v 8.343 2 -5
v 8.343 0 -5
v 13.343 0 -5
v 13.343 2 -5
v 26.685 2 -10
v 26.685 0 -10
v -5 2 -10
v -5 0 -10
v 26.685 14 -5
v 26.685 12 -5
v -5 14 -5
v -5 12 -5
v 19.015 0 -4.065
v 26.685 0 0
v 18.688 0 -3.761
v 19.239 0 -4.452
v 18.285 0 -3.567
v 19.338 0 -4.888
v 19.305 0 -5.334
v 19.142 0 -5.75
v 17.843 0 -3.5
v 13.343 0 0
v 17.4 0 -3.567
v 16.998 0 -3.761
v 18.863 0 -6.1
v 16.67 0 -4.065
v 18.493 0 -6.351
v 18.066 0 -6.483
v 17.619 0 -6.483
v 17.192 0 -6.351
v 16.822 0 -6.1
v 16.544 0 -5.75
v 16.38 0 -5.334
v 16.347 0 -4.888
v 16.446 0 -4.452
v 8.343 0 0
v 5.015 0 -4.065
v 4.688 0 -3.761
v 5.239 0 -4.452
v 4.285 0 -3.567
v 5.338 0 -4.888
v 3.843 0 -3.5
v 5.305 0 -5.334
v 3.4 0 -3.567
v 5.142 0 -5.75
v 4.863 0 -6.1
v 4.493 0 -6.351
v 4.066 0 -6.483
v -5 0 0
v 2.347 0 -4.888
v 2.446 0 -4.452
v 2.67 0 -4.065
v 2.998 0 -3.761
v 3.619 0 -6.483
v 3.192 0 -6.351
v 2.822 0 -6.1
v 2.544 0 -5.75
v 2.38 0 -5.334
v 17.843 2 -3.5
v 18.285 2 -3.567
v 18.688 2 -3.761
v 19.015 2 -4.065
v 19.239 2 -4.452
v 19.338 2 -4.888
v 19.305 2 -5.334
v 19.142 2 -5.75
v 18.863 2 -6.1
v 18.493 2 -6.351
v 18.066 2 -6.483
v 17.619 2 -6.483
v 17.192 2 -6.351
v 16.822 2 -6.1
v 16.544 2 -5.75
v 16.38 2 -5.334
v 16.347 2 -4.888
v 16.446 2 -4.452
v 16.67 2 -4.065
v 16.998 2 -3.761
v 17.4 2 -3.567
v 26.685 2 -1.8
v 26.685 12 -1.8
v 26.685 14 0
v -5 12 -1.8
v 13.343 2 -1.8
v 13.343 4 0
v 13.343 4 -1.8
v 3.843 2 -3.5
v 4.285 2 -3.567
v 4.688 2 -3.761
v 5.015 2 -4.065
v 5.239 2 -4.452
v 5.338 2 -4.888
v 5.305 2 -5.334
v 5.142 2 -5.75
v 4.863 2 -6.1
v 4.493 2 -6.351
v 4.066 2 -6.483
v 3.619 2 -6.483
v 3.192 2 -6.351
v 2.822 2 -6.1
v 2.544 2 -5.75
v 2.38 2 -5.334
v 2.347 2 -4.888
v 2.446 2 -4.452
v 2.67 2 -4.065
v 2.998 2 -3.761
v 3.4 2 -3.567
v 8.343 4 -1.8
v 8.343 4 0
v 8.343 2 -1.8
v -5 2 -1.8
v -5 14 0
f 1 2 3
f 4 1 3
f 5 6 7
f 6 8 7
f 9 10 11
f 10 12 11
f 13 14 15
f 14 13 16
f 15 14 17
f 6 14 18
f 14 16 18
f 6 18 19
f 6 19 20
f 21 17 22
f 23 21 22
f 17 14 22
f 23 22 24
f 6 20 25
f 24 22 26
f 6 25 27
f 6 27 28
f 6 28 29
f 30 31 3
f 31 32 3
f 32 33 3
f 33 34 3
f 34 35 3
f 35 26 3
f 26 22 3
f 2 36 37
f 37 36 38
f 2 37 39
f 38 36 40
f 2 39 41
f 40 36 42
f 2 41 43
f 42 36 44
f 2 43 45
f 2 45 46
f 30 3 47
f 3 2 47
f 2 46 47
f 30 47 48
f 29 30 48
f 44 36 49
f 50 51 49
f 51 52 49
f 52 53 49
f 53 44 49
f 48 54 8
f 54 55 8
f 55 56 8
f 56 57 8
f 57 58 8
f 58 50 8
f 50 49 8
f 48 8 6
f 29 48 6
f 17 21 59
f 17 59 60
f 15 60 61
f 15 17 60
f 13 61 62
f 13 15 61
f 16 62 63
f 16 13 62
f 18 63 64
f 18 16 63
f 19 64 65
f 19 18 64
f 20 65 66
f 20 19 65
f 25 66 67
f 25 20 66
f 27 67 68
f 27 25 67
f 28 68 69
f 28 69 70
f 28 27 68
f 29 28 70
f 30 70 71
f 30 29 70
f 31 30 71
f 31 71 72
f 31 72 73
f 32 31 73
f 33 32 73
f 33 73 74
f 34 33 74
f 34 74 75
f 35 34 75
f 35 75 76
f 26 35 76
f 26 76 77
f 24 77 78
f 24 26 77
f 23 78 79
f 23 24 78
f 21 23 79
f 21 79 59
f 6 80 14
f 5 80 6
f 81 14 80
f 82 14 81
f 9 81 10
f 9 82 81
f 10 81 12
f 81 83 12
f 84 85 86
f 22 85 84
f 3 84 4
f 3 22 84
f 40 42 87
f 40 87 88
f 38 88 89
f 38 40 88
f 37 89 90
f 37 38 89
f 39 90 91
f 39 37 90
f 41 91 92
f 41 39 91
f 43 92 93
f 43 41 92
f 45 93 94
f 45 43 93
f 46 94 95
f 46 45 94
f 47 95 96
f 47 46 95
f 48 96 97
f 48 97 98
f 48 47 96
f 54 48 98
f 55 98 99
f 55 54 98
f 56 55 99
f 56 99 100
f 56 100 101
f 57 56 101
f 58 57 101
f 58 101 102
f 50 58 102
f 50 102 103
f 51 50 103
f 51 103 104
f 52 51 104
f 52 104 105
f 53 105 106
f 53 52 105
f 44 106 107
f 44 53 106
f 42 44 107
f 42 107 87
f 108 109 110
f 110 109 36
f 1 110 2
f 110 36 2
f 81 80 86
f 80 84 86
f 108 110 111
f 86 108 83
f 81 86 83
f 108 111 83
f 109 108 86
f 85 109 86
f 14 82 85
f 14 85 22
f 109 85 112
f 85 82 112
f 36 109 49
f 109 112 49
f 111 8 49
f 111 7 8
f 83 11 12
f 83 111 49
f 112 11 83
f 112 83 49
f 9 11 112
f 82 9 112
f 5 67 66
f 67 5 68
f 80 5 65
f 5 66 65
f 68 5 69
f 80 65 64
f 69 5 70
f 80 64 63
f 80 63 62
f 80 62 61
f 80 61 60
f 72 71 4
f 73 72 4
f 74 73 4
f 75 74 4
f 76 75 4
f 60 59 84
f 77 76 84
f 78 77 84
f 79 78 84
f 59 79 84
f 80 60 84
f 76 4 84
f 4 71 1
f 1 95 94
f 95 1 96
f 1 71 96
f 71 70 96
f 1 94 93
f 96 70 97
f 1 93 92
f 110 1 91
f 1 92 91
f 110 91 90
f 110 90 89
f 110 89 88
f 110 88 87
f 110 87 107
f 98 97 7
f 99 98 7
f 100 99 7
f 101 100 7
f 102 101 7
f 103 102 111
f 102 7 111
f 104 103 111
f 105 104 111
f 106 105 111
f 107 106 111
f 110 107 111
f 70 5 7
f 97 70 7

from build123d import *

# Parameters (mm, degrees)
CROQUIS2_W                 = 21.685111185
CROQUIS2_H                 = 10
CROQUIS2_R                 = 1.5
SALIENTE_EXTRUIR1_DEPTH    = 2
CROQUIS3_W                 = 21.685111185
CROQUIS3_H                 = 1.8
SALIENTE_EXTRUIR2_DEPTH    = 10
CORTAR_EXTRUIR1_DEPTH      = 2
CORTAR_EXTRUIR1_DEPTH_BACK = 10
CROQUIS4_W                 = 5
CROQUIS4_H                 = 5
CROQUIS7_W                 = 21.685111185
CROQUIS7_H                 = 5
SALIENTE_EXTRUIR4_DEPTH    = 2
SALIENTE_EXTRUIR5_DEPTH    = 5
SALIENTE_EXTRUIR6_DEPTH    = 5


with BuildPart() as part:
    # Croquis2 → Saliente-Extruir1 (new body)
    with BuildSketch(Plane(origin=(0, 0, 0), x_dir=(1, 0, 0), z_dir=(0, 1, 0))):
        with Locations((10.842555593, 5)):
            Rectangle(CROQUIS2_W, CROQUIS2_H)
        with Locations(Location((3.842555592, 5, 0), (0, 0, 270))):
            Circle(CROQUIS2_R, mode=Mode.SUBTRACT)
        with Locations(Location((17.842555592, 5, 0), (0, 0, 270))):
            Circle(CROQUIS2_R, mode=Mode.SUBTRACT)
    extrude(amount=SALIENTE_EXTRUIR1_DEPTH)

    # Croquis3 → Saliente-Extruir2 (add)
    with BuildSketch(Plane(origin=(0, 2, 0), x_dir=(1, 0, 0), z_dir=(0, 1, 0))):
        with Locations((10.842555593, 0.9)):
            Rectangle(CROQUIS3_W, CROQUIS3_H)
    extrude(amount=SALIENTE_EXTRUIR2_DEPTH)

    # Croquis4 → Cortar-Extruir1 (cut, two sides: drawn at the far end of the back side and taken through both)
    with BuildSketch(Plane(origin=(0, 2, 0), x_dir=(1, 0, 0), z_dir=(0, 1, 0)).offset(-CORTAR_EXTRUIR1_DEPTH_BACK)):
        with Locations((10.842555592, 2.5)):
            Rectangle(CROQUIS4_W, CROQUIS4_H)
    extrude(amount=CORTAR_EXTRUIR1_DEPTH + CORTAR_EXTRUIR1_DEPTH_BACK, mode=Mode.SUBTRACT)

    # Croquis7 → Saliente-Extruir4 (add)
    with BuildSketch(Plane(origin=(0, 12, 0), x_dir=(1, 0, 0), z_dir=(0, 1, 0))):
        with Locations((10.842555593, 2.5)):
            Rectangle(CROQUIS7_W, CROQUIS7_H)
    extrude(amount=SALIENTE_EXTRUIR4_DEPTH)

    # Croquis8 → Saliente-Extruir5 (add)
    with BuildSketch(Plane.ZY):
        Polygon((-10, 0), (0, 0), (0, 14), (-5, 14), (-5, 12), (-1.8, 12), (-1.8, 2), (-10, 2), align=None)
    extrude(amount=SALIENTE_EXTRUIR5_DEPTH)

    # Croquis9 → Saliente-Extruir6 (add)
    with BuildSketch(Plane(origin=(21.685111185, 0, 0), x_dir=(0, 0, -1), z_dir=(1, 0, 0))):
        Polygon((0, 0), (10, 0), (10, 2), (1.8, 2), (1.8, 12), (5, 12), (5, 14), (0, 14), align=None)
    extrude(amount=SALIENTE_EXTRUIR6_DEPTH)


solid = part.part
